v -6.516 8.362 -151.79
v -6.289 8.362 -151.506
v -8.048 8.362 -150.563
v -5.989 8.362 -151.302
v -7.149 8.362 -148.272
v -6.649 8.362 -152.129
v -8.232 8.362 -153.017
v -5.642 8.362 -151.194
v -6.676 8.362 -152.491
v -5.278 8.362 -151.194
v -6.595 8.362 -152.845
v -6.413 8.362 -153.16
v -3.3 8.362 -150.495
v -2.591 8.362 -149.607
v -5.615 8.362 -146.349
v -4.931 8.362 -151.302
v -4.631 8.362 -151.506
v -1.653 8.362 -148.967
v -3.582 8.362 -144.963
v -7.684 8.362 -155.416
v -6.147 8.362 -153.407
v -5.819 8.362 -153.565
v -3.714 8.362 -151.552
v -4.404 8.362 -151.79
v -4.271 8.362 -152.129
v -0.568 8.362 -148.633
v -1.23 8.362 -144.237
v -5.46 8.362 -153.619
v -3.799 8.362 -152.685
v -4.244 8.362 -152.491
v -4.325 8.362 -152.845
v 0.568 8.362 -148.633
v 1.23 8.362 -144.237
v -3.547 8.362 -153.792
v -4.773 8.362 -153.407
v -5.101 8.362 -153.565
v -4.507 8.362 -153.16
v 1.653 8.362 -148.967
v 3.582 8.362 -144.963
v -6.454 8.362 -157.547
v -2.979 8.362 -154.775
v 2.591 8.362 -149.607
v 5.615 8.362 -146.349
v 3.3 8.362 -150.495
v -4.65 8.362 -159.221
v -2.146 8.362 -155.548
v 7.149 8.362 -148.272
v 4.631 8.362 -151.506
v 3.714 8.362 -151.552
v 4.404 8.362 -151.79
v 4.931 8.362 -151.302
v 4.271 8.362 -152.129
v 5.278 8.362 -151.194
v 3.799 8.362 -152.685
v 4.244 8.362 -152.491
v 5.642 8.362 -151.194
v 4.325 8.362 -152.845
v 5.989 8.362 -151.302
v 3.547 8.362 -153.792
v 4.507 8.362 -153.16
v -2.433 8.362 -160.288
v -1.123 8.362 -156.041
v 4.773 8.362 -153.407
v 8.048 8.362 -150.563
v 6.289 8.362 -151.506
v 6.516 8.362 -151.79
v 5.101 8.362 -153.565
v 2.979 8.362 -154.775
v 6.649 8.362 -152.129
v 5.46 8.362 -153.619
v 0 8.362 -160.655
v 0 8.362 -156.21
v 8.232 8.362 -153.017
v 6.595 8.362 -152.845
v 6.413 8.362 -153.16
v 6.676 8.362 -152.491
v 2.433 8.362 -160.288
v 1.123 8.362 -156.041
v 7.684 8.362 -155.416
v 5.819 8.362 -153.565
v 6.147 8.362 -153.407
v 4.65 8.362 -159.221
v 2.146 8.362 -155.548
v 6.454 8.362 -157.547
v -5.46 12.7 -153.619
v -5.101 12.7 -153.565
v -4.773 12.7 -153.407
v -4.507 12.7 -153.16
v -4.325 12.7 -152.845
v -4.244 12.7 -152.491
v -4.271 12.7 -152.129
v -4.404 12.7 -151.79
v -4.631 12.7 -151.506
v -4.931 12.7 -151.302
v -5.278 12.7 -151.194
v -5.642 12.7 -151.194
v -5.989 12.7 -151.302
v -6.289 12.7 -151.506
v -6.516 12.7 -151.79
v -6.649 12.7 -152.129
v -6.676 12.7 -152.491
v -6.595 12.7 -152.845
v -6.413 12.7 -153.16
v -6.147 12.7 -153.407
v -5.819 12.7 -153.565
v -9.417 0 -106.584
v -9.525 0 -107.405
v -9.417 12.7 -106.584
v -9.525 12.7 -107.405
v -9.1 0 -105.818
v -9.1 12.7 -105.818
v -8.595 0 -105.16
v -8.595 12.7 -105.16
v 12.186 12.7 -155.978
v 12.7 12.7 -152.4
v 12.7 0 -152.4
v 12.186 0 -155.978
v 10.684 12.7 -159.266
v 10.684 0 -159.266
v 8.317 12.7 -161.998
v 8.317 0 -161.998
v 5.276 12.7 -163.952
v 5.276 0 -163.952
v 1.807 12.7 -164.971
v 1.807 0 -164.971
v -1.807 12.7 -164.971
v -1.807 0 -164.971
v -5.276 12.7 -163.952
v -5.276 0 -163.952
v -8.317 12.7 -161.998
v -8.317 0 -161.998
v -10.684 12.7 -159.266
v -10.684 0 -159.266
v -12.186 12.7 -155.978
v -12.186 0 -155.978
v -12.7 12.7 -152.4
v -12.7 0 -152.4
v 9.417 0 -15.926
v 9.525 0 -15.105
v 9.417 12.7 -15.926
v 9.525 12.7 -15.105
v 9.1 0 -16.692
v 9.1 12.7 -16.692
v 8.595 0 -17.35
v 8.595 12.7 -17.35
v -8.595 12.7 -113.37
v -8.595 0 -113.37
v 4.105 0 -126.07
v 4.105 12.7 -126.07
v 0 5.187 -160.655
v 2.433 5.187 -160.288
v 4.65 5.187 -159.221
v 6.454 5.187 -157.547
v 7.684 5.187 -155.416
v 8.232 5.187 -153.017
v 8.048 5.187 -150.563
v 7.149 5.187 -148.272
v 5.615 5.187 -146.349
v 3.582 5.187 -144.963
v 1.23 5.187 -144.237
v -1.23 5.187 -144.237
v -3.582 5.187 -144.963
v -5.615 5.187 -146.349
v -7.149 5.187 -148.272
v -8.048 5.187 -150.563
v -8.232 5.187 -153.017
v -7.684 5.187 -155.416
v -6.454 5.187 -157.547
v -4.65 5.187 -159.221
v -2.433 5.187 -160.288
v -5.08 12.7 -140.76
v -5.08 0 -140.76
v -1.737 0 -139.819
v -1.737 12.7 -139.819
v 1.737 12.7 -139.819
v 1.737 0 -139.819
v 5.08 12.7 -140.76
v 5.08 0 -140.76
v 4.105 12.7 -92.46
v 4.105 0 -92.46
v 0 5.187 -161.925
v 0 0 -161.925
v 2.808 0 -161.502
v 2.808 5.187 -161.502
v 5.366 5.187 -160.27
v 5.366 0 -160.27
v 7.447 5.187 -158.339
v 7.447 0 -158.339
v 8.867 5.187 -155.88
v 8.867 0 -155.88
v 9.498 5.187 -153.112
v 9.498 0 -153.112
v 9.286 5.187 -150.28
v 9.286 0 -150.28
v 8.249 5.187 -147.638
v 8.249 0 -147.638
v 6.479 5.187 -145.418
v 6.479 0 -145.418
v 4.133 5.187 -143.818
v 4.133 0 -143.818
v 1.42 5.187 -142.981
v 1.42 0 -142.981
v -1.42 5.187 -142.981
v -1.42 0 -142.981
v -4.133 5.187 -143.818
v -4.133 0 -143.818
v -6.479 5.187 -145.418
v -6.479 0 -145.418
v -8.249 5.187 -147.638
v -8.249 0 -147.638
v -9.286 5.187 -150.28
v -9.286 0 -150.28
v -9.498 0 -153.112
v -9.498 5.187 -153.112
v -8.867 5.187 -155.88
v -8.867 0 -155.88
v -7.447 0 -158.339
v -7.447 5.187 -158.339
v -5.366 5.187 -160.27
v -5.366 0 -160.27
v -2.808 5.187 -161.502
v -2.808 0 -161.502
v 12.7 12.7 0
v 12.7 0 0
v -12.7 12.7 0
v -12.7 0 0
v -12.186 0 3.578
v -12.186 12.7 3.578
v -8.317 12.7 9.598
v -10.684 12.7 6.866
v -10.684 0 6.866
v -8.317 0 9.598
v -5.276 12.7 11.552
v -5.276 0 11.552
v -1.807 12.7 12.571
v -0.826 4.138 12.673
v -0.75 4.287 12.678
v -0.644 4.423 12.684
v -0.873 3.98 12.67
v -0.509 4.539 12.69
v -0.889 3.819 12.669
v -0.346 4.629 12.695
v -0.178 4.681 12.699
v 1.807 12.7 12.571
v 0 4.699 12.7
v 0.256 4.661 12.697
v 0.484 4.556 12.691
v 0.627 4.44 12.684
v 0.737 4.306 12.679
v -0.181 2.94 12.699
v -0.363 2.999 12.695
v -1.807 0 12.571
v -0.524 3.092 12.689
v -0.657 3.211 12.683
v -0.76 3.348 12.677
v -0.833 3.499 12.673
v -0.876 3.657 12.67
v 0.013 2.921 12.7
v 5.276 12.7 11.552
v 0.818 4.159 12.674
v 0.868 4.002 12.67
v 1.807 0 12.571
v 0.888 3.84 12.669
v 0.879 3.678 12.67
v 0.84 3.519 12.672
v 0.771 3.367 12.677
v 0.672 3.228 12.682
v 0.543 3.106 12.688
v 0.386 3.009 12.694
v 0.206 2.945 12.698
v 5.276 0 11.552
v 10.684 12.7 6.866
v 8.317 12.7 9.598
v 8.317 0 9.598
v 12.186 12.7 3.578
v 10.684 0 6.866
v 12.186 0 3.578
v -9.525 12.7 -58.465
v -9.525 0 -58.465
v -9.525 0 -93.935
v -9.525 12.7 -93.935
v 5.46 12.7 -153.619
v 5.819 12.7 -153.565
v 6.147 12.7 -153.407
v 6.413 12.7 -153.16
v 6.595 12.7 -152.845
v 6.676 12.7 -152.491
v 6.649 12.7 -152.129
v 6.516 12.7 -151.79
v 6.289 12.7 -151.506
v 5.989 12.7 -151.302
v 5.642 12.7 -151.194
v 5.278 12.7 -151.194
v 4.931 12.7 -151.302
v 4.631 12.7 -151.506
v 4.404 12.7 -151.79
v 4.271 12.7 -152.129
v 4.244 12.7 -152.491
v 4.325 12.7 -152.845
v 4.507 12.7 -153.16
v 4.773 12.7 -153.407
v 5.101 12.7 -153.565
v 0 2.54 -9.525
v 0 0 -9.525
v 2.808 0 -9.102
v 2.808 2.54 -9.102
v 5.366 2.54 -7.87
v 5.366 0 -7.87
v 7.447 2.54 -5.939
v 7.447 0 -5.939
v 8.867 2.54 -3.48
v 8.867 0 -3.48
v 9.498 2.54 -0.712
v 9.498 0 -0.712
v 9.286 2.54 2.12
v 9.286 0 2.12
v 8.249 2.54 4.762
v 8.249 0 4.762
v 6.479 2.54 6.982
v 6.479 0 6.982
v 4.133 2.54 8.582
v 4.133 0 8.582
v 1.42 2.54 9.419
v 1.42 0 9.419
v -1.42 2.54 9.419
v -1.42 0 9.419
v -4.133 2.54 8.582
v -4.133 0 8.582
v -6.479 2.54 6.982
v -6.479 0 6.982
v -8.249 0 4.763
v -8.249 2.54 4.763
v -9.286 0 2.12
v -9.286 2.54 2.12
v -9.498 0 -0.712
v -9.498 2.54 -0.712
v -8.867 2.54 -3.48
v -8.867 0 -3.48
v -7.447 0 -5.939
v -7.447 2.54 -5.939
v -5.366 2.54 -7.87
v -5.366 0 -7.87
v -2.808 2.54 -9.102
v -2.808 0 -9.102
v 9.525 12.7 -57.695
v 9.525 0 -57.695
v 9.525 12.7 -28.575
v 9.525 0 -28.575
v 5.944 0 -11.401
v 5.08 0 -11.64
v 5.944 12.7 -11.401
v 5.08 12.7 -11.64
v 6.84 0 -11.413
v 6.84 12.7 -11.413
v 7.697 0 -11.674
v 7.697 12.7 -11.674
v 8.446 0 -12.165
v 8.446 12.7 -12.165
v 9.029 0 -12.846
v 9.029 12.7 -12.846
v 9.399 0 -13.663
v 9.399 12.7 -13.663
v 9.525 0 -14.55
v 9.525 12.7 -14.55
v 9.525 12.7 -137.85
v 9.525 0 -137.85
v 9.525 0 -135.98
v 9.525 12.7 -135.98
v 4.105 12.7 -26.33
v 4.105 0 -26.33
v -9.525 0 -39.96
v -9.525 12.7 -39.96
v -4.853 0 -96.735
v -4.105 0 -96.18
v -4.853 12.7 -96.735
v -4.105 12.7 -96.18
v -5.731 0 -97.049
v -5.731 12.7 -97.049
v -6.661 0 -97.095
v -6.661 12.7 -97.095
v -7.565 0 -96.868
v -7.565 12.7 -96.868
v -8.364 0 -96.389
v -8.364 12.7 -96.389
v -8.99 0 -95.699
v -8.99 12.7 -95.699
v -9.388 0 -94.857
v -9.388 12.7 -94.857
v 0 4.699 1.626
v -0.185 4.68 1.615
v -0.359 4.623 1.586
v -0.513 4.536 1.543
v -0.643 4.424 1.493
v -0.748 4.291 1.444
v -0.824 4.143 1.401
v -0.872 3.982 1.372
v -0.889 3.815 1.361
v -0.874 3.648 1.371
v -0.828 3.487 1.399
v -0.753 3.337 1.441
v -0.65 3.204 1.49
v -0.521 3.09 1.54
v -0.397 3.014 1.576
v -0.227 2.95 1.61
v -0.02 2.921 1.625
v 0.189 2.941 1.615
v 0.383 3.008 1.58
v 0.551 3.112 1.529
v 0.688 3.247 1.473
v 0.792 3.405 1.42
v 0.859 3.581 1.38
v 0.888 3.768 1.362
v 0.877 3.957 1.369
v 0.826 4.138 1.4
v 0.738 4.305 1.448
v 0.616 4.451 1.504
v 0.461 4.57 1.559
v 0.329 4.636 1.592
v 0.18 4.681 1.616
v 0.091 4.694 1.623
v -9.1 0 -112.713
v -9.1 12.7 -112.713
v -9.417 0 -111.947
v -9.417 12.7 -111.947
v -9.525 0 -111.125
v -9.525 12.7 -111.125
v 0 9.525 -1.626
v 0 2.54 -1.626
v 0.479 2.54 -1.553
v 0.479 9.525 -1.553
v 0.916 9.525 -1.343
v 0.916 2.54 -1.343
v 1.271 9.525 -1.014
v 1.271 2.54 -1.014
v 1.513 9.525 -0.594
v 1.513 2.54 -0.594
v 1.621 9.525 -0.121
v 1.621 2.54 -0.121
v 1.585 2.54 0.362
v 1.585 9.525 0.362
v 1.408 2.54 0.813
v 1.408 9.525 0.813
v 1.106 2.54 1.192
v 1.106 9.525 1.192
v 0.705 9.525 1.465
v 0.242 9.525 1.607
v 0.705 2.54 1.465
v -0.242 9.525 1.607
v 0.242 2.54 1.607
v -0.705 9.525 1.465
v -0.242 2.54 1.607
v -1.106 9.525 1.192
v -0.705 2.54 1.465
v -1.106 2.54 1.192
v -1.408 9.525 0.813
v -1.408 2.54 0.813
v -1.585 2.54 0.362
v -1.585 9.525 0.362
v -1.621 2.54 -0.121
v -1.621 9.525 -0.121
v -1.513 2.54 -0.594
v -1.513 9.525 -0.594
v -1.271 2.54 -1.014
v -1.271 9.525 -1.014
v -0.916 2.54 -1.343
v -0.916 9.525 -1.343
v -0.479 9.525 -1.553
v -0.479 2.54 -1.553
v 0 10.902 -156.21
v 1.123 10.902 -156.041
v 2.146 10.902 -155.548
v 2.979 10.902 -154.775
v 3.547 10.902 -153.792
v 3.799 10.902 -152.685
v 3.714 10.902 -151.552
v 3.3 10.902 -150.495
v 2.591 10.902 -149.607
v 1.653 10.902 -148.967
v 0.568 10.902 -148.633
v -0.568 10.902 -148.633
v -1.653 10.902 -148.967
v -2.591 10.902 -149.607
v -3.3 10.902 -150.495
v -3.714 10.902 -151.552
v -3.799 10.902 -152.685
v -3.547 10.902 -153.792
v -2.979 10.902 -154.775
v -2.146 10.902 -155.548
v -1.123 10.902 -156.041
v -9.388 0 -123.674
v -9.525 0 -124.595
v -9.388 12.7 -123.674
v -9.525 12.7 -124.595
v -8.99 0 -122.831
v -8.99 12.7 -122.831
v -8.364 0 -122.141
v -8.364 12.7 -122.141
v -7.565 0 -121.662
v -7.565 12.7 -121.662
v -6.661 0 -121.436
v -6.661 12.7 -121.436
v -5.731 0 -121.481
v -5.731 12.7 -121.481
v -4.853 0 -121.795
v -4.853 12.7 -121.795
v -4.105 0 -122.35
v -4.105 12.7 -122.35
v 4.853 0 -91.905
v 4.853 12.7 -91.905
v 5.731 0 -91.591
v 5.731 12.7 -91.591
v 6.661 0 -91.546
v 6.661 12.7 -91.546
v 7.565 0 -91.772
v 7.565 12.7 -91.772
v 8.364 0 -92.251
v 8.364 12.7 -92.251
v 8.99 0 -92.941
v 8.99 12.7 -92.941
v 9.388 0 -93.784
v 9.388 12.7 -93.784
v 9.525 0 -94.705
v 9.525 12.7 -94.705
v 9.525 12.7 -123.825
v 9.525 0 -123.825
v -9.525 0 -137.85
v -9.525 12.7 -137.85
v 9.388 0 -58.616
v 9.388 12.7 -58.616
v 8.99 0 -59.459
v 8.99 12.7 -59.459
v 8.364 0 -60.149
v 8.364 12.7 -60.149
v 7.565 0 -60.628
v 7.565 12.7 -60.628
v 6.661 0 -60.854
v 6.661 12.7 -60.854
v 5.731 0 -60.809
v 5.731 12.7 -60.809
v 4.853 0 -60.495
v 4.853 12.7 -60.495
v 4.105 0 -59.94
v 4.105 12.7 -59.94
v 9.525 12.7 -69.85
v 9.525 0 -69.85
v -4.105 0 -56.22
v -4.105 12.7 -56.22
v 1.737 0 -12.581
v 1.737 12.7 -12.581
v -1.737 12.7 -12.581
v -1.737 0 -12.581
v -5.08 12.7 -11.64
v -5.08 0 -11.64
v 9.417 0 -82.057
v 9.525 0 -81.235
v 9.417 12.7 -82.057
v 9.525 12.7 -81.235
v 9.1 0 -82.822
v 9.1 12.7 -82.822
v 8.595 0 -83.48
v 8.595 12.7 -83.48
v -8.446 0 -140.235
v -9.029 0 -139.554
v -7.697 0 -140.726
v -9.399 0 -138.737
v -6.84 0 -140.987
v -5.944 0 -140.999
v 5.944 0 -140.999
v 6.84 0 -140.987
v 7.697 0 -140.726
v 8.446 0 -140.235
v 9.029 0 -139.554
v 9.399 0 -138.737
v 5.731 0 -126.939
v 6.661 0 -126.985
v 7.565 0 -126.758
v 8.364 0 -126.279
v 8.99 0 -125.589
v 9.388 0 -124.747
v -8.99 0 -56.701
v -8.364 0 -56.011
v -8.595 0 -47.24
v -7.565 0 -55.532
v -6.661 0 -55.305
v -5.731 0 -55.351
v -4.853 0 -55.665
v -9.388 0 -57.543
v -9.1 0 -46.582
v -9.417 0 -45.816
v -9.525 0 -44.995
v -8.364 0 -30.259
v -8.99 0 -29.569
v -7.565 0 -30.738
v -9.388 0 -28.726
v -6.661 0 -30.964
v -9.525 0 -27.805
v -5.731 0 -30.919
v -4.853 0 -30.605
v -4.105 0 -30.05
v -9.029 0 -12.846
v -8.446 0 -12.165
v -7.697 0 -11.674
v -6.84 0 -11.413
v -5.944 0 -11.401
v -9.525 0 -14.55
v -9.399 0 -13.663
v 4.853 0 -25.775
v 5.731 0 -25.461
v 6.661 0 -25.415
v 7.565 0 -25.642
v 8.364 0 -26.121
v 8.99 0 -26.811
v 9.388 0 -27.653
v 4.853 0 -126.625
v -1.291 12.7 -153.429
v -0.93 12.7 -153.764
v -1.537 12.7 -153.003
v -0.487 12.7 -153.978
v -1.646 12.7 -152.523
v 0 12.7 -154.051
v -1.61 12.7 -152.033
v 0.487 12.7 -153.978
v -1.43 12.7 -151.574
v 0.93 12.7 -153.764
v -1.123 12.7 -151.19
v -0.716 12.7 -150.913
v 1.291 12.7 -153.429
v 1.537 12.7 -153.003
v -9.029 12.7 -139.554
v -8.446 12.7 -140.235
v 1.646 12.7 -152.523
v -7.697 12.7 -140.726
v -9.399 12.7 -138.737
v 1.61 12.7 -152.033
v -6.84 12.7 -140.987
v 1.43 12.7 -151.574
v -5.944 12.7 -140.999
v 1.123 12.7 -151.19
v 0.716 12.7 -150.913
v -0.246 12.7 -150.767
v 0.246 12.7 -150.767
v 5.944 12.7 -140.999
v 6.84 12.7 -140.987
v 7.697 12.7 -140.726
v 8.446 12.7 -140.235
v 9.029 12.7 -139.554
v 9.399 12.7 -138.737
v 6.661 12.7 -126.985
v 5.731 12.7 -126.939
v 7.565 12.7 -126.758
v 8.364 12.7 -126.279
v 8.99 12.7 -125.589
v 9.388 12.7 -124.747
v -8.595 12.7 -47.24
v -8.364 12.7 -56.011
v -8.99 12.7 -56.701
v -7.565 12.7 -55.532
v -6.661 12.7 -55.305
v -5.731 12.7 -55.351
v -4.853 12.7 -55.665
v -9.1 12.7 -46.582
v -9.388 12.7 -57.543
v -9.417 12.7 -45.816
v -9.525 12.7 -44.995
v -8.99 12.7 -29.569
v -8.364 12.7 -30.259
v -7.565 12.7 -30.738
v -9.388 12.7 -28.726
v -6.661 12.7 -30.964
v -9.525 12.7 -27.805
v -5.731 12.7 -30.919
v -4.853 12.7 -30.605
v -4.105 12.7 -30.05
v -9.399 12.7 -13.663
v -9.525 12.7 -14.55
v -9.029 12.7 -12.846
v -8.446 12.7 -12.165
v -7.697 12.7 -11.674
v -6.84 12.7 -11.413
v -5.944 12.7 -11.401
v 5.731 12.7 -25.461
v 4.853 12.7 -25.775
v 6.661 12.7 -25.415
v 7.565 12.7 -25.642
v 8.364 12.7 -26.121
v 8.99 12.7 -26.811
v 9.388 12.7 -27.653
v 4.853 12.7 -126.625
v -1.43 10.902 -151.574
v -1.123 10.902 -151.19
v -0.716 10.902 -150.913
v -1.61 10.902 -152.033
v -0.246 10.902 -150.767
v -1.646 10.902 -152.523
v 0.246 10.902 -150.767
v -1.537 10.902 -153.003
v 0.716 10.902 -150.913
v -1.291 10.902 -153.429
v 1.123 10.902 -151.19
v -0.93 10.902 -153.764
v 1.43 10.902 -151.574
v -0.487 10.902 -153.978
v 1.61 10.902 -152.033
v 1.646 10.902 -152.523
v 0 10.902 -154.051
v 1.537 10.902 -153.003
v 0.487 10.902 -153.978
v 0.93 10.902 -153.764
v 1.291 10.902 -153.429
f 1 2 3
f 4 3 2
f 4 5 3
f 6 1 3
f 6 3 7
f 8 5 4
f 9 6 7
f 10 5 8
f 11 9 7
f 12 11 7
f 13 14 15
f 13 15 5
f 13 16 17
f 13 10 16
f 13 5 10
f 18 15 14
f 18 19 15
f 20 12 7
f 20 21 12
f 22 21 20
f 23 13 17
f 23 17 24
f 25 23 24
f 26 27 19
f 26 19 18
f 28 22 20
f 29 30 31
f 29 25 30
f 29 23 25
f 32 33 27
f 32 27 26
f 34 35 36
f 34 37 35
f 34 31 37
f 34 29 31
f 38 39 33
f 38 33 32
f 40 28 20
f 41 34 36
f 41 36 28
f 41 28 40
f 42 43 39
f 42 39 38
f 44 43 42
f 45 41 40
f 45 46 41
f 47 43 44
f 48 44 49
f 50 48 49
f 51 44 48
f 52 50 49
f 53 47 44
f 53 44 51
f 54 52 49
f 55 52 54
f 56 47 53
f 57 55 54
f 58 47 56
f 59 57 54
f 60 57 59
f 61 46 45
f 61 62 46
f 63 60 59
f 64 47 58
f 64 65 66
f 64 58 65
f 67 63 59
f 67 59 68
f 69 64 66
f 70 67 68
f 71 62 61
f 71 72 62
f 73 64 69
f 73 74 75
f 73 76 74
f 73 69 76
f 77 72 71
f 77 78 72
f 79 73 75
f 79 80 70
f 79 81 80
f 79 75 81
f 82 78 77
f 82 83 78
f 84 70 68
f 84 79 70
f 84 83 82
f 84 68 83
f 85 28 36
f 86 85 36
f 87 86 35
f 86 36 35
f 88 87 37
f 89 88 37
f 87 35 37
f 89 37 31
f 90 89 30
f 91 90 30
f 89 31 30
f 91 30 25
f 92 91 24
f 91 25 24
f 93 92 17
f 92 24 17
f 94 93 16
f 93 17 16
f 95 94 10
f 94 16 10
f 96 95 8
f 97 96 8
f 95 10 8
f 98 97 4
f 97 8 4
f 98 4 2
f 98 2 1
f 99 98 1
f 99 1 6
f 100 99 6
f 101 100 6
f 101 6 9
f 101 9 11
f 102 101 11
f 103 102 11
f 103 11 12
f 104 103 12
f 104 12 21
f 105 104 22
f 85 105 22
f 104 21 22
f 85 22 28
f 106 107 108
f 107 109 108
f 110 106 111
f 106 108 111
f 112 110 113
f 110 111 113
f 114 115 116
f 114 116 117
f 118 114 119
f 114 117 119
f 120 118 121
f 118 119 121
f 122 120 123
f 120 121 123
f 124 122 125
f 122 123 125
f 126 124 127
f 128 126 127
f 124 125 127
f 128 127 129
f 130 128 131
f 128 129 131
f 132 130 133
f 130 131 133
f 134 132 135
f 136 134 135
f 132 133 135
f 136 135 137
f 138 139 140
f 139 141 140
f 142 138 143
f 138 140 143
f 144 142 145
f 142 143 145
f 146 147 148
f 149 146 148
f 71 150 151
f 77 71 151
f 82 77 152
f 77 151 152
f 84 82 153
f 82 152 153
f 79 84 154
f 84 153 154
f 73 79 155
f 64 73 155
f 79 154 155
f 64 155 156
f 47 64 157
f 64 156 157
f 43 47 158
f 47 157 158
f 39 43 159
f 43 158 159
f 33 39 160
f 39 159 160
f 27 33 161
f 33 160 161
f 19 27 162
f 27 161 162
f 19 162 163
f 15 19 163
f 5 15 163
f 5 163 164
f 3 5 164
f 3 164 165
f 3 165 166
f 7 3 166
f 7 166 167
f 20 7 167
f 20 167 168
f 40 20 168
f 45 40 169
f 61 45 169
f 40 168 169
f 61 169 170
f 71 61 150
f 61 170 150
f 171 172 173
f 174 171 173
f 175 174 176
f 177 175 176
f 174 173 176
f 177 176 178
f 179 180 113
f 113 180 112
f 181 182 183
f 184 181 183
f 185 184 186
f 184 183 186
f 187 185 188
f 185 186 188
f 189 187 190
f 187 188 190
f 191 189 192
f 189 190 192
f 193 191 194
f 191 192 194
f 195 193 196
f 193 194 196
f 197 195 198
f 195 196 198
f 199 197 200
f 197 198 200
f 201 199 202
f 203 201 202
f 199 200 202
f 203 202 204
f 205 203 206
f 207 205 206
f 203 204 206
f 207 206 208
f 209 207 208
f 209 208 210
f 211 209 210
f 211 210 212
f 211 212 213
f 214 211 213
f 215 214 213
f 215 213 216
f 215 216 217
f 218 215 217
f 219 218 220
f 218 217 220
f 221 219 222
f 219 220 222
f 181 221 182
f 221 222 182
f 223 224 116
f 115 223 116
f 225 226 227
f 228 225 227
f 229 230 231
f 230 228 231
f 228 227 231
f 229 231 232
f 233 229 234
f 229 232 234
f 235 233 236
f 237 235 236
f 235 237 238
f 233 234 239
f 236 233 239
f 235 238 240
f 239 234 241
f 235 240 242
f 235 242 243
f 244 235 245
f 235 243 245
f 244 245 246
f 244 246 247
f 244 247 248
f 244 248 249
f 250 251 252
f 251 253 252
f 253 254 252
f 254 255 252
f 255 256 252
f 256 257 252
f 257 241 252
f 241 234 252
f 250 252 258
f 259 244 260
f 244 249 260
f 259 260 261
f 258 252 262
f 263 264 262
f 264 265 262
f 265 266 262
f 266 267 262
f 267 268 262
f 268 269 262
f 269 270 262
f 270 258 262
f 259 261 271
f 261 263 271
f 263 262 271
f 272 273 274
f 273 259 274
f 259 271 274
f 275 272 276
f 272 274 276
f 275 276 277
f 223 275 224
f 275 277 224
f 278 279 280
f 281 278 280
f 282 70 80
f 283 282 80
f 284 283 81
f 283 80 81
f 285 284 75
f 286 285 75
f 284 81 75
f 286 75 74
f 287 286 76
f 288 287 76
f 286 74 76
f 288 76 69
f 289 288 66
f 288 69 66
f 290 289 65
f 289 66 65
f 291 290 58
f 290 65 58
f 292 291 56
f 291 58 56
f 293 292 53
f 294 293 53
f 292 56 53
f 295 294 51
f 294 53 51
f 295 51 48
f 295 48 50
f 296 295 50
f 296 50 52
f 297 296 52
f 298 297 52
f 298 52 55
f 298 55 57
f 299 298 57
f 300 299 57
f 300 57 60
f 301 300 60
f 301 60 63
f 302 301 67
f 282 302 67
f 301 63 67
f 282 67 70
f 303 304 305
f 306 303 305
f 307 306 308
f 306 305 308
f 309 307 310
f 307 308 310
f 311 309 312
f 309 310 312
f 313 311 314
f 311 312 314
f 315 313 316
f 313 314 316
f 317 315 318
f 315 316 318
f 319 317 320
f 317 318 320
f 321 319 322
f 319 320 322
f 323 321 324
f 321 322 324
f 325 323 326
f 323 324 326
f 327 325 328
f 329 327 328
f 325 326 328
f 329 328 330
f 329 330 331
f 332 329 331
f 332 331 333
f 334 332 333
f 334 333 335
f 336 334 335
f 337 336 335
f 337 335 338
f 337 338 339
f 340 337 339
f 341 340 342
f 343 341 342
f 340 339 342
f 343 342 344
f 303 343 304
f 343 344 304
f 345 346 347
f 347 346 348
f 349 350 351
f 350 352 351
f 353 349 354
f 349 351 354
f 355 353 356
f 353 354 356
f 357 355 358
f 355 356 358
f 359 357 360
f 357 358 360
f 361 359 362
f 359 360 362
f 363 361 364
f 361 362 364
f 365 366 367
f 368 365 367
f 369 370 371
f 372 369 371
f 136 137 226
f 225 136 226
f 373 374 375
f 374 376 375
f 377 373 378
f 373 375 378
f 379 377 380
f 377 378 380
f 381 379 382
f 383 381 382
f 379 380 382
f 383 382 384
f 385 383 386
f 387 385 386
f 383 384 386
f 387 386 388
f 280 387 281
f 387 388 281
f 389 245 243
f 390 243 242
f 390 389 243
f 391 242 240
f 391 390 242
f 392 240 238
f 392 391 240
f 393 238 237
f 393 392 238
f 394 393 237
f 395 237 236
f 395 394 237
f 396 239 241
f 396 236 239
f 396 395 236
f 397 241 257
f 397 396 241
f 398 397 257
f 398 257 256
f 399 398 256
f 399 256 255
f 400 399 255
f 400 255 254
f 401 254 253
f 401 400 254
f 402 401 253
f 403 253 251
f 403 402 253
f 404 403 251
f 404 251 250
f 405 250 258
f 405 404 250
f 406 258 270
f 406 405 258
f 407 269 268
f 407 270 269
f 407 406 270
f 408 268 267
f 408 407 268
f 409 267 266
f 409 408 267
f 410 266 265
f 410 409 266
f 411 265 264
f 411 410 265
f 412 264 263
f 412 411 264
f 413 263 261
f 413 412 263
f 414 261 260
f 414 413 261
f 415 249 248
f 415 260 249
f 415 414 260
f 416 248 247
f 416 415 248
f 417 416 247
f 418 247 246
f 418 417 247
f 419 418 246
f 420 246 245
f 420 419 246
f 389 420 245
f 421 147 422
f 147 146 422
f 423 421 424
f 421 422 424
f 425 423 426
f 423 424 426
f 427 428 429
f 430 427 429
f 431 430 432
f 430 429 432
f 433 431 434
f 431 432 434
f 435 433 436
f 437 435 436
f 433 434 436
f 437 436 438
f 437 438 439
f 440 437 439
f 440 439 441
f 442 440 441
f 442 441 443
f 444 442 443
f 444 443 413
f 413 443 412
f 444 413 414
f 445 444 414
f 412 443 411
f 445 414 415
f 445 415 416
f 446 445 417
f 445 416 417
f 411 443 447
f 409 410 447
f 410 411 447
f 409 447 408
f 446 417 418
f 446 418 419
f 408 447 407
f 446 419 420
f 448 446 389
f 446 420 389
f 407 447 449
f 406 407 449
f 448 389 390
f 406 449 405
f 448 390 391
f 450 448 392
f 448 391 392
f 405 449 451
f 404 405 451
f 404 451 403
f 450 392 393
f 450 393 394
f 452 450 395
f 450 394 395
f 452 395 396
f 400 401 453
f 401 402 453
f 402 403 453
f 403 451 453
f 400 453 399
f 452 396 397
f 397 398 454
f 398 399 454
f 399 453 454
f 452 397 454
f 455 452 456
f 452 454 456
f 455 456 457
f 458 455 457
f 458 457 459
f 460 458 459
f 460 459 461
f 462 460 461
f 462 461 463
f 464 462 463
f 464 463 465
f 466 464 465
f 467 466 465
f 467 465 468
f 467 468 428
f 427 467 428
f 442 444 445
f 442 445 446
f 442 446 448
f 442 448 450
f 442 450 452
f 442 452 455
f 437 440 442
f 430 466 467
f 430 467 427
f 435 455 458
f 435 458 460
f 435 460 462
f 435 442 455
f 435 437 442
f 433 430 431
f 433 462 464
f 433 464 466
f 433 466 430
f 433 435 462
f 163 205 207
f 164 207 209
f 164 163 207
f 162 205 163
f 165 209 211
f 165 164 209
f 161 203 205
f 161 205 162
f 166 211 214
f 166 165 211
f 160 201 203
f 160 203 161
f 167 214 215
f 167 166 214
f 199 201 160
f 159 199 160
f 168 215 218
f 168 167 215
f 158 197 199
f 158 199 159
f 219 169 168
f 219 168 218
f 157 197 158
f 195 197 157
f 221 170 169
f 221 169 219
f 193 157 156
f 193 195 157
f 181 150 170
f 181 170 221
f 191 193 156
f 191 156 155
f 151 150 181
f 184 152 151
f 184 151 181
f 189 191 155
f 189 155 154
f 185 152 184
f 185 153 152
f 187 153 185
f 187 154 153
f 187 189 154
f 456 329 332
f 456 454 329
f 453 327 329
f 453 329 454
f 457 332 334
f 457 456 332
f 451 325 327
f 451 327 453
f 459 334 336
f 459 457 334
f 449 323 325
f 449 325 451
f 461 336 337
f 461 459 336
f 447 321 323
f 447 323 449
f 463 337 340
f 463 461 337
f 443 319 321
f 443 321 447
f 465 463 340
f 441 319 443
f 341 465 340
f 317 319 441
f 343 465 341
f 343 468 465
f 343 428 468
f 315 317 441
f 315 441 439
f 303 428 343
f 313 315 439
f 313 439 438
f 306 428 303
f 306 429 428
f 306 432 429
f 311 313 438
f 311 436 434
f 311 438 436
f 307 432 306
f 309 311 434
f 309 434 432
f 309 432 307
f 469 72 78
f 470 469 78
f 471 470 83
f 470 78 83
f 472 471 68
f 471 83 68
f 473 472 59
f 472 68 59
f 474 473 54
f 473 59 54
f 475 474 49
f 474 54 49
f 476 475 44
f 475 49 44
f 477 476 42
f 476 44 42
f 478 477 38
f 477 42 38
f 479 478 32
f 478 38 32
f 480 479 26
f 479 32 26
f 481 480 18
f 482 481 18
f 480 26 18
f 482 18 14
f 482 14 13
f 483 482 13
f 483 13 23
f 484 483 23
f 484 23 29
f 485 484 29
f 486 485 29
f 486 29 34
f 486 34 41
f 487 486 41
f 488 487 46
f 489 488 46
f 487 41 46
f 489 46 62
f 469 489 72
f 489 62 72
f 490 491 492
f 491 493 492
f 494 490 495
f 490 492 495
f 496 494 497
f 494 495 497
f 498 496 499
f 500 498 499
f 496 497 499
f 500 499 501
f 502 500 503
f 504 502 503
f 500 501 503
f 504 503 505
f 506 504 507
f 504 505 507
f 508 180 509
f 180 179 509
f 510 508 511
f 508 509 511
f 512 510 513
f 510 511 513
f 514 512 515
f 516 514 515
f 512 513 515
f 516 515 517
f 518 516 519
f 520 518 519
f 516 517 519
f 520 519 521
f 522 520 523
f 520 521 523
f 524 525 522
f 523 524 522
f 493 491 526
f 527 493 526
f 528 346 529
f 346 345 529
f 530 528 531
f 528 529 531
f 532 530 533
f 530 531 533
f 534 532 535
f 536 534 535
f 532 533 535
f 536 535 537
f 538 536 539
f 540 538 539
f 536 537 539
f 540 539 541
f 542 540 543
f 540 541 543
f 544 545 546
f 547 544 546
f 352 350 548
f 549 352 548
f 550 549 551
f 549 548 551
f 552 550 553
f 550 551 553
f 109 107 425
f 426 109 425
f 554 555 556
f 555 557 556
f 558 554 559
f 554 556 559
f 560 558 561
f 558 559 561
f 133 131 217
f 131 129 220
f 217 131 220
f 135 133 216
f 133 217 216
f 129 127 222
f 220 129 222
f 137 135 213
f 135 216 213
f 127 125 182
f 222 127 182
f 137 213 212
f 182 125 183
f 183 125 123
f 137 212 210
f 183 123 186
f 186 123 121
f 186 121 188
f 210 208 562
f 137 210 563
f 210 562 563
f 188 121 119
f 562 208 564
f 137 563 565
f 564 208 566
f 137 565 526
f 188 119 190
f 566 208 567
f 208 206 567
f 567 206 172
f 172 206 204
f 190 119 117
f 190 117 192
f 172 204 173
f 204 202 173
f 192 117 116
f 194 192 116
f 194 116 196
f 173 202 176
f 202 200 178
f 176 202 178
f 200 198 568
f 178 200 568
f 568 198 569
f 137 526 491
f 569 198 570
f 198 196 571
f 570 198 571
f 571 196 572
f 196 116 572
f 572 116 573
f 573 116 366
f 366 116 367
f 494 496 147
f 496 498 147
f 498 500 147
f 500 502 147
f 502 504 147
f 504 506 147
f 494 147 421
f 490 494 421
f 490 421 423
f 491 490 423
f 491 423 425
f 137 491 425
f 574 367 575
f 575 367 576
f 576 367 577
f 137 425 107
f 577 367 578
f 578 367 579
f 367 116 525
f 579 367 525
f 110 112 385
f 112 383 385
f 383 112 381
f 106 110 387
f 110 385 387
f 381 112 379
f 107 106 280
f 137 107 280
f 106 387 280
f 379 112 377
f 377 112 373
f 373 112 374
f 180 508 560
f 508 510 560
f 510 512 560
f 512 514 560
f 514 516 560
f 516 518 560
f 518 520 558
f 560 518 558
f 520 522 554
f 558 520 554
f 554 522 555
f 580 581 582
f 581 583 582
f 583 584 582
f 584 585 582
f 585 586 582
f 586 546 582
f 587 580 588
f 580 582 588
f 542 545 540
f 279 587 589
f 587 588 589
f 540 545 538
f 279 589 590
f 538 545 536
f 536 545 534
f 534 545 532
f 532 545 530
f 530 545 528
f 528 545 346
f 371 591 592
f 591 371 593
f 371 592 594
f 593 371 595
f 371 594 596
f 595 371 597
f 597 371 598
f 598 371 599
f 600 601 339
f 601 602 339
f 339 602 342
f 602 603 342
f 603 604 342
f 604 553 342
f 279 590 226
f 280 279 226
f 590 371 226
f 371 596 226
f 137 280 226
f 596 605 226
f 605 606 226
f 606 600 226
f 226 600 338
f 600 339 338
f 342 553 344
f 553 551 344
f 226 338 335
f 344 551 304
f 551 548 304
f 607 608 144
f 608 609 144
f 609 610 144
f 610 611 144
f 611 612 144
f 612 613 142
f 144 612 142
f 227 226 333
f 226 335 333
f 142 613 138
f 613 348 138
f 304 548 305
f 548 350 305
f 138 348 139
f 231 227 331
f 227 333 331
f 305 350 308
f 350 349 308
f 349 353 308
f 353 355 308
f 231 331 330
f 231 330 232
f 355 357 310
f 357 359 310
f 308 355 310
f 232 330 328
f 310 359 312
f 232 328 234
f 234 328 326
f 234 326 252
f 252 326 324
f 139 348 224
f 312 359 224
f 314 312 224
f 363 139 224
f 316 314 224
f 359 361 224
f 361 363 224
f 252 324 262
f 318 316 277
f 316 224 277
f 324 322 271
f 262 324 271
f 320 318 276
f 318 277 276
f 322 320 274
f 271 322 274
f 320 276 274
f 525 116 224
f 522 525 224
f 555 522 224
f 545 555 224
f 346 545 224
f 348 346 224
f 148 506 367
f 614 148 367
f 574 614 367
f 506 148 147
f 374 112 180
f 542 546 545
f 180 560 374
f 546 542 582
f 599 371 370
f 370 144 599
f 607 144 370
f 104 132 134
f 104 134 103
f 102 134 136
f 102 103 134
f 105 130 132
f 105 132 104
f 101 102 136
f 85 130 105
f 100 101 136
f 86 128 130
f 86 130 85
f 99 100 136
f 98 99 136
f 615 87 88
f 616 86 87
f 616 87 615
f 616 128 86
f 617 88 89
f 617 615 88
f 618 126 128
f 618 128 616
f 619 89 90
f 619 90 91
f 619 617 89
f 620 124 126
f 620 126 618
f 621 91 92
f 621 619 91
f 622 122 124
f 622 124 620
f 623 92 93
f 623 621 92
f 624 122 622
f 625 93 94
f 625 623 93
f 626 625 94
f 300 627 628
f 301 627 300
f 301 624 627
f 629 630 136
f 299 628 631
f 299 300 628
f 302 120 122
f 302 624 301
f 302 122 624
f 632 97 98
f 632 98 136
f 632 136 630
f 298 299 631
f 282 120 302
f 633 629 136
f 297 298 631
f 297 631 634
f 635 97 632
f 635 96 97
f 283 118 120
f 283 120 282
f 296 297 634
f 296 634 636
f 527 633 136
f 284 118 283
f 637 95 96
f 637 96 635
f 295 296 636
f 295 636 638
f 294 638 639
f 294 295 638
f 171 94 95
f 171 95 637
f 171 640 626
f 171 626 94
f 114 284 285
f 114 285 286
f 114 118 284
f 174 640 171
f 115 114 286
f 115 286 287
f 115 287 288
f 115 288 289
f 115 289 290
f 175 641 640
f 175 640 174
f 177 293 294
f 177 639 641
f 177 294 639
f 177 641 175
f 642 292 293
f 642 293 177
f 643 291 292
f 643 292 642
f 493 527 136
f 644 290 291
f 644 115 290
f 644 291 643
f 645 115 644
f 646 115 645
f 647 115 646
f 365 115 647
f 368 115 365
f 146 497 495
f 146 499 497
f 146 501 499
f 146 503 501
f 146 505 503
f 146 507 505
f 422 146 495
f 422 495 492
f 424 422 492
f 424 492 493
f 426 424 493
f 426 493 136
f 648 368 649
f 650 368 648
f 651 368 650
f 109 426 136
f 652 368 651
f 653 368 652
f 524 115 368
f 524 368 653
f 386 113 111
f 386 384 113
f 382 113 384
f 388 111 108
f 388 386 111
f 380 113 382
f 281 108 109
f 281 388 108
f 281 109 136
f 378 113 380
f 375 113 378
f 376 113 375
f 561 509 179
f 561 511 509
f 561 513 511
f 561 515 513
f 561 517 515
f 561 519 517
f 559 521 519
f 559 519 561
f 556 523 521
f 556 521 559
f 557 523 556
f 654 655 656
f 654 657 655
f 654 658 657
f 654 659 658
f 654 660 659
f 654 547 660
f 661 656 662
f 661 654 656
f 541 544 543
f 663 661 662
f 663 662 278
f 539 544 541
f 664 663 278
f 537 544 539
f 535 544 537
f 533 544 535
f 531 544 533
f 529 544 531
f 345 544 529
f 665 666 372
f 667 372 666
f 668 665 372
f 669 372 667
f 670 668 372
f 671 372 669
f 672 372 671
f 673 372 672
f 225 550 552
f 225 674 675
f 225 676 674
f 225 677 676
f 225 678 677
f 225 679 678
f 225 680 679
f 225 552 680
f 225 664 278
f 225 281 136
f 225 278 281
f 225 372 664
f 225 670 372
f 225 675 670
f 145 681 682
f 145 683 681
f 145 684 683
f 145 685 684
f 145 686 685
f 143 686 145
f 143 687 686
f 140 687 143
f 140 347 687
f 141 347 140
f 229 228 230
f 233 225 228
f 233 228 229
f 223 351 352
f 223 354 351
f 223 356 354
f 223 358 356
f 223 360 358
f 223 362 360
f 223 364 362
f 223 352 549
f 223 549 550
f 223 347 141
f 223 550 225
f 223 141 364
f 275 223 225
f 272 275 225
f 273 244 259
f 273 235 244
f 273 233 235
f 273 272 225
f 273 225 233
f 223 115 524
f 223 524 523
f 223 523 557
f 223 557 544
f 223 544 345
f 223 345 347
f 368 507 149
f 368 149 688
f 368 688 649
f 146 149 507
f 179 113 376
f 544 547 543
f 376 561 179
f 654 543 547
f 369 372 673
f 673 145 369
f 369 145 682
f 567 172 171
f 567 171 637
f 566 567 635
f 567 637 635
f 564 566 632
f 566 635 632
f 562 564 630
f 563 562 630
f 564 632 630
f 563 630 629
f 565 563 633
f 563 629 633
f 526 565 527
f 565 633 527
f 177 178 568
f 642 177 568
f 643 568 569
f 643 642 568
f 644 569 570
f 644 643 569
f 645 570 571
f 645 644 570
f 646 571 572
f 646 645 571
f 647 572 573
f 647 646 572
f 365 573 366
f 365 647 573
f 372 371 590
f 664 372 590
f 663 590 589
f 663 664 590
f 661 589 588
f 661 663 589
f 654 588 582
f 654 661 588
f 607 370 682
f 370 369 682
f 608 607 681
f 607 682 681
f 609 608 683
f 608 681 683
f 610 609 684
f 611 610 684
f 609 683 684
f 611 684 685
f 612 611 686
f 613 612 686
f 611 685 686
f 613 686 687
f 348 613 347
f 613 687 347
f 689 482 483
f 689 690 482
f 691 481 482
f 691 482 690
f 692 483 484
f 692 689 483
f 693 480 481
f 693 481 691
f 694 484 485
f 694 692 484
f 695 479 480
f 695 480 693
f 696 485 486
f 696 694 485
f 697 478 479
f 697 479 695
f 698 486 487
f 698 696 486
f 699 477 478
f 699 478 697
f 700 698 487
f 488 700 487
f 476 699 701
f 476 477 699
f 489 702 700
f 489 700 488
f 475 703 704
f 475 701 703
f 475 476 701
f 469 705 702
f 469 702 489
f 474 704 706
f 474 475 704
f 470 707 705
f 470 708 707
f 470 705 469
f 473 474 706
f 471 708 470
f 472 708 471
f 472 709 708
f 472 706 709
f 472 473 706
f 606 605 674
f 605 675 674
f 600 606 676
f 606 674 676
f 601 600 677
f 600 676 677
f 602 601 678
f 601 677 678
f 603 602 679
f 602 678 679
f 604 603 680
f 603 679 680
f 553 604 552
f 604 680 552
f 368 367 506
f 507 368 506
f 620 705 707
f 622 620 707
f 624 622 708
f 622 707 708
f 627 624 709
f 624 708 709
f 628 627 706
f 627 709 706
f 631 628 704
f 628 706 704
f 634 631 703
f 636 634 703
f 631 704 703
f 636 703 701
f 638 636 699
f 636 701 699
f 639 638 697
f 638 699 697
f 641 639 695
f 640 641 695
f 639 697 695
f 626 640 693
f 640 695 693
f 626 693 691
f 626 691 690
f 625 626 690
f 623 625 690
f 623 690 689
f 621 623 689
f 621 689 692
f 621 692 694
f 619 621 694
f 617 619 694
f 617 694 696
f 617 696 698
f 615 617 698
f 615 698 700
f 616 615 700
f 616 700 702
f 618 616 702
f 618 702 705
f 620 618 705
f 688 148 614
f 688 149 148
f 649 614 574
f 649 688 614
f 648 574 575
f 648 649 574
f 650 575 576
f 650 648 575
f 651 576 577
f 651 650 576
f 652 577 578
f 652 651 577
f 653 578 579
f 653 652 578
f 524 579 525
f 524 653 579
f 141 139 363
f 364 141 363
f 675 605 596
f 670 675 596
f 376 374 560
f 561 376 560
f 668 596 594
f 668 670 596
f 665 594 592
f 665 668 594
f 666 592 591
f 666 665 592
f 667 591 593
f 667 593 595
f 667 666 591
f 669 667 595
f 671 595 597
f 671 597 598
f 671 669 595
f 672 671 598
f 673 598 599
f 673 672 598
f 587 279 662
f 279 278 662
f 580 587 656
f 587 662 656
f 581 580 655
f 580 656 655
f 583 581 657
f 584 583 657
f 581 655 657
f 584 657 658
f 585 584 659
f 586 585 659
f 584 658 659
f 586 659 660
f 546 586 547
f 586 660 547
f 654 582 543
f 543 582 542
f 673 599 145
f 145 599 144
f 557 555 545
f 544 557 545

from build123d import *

# Parameters (mm, degrees)
SKETCH1_R           = 12.7
BOSS_EXTRUDE1_DEPTH = 12.7
SKETCH2_R           = 1.6256
CUT_EXTRUDE1_DEPTH  = 9.525
SKETCH3_R           = 9.525
CUT_EXTRUDE2_DEPTH  = 2.54
BOSS_EXTRUDE2_START = -12.7
BOSS_EXTRUDE2_DEPTH = 12.7
SKETCH10_R          = 1.651
CUT_EXTRUDE4_DEPTH  = 12.7
SKETCH11_R          = 9.525
CUT_EXTRUDE5_DEPTH  = 5.18668
CUT_EXTRUDE6_DEPTH  = 12.7
FILLET1_R           = 3.175
SKETCH16_R          = 8.255
CUT_EXTRUDE8_DEPTH  = 3.175
SKETCH17_R          = 1.2192
CUT_EXTRUDE9_DEPTH  = 4.33832
SKETCH18_R          = 3.81
CUT_EXTRUDE10_DEPTH = 2.54


with BuildPart() as part:
    # Sketch1 → Boss-Extrude1 (new body)
    with BuildSketch(Plane(origin=(0, 0, 0), x_dir=(1, 0, 0), z_dir=(0, 1, 0))):
        with Locations(Location((0, 0, 0), (0, 0, 270))):
            Circle(SKETCH1_R)
    extrude(amount=BOSS_EXTRUDE1_DEPTH)

    # Sketch2 → Cut-Extrude1 (cut)
    with BuildSketch(Plane.XZ):
        with Locations(Location((0, 0, 0), (0, 0, 270))):
            Circle(SKETCH2_R)
    extrude(amount=-CUT_EXTRUDE1_DEPTH, mode=Mode.SUBTRACT)

    # Sketch3 → Cut-Extrude2 (cut)
    with BuildSketch(Plane.XZ):
        with Locations(Location((0, 0, 0), (0, 0, 270))):
            Circle(SKETCH3_R)
    extrude(amount=-CUT_EXTRUDE2_DEPTH, mode=Mode.SUBTRACT)

    # Sketch5 → #2-56 Tapped Hole1 (revolve, cut)
    with BuildSketch(Plane(origin=(0, 3.81, 0), x_dir=(0, 1, 0), z_dir=(1, 0, 0))):
        Polygon((0, 0), (0, 13.74216509), (0.889, 13.208), (0.889, 0), align=None)
    revolve(axis=Axis((0, 3.81, -6.35), (0, 0, 1)), mode=Mode.SUBTRACT)

    # Sketch7 → Boss-Extrude2 (add)
    with BuildSketch(Plane(origin=(0, 12.7, 0), x_dir=(1, 0, 0), z_dir=(0, 1, 0)).offset(BOSS_EXTRUDE2_START)):
        with BuildLine():
            Line((-12.7, 152.4), (-12.7, 0))
            ThreePointArc((-12.7, 0), (0, 12.7), (12.7, 0))
            Line((12.7, 0), (12.7, 152.4))
            ThreePointArc((12.7, 152.4), (0, 165.1), (-12.7, 152.4))
        make_face()
    extrude(amount=BOSS_EXTRUDE2_DEPTH)

    # Sketch10 → Cut-Extrude4 (cut)
    with BuildSketch(Plane.XZ):
        with Locations(Location((0, -152.4, 0), (0, 0, 270))):
            Circle(SKETCH10_R)
    extrude(amount=-CUT_EXTRUDE4_DEPTH, mode=Mode.SUBTRACT)

    # Sketch11 → Cut-Extrude5 (cut)
    with BuildSketch(Plane.XZ):
        with Locations(Location((0, -152.4, 0), (0, 0, 270))):
            Circle(SKETCH11_R)
    extrude(amount=-CUT_EXTRUDE5_DEPTH, mode=Mode.SUBTRACT)

    # Sketch15 → Cut-Extrude6 (cut)
    with BuildSketch(Plane.XZ):
        with BuildLine():
            Line((-9.525, -35.469743879), (9.525, -16.419743879))
            Line((9.525, -16.419743879), (9.525, -8.400260413))
            ThreePointArc((9.525, -8.400260413), (0, -12.7), (-9.525, -8.400260413))
            Line((-9.525, -8.400260413), (-9.525, -35.469743879))
        make_face()
        Polygon((-9.525, -46.309871939), (9.525, -65.359871939), (9.525, -20.909871939), (-9.525, -39.959871939), align=None)
        Polygon((-9.525, -76.2), (9.525, -76.2), (9.525, -69.85), (-9.525, -50.8), align=None)
        Polygon((9.525, -82.55), (9.525, -76.2), (-9.525, -76.2), (-9.525, -101.6), align=None)
        Polygon((9.525, -131.490128061), (9.525, -87.040128061), (-9.525, -106.090128061), (-9.525, -112.440128061), align=None)
        with BuildLine():
            Line((9.525, -143.999739587), (9.525, -135.980256121))
            Line((9.525, -135.980256121), (-9.525, -116.930256121))
            Line((-9.525, -116.930256121), (-9.525, -143.999739587))
            ThreePointArc((-9.525, -143.999739587), (0, -139.7), (9.525, -143.999739587))
        make_face()
    extrude(amount=-CUT_EXTRUDE6_DEPTH, mode=Mode.SUBTRACT)

    # Fillet1
    fillet1_edges = [part.edges().sort_by_distance(p)[0] for p in [
        (9.525, 6.35, -143.999739587),
        (-9.525, 6.35, -143.999739587),
        (-9.525, 6.35, -116.930256121),
        (-9.525, 6.35, -35.469743879),
        (9.525, 6.35, -16.419743879),
        (9.525, 6.35, -8.400260413),
        (-9.525, 6.35, -8.400260413),
        (-9.525, 6.35, -46.309871939),
        (9.525, 6.35, -65.359871939),
        (9.525, 6.35, -20.909871939),
        (-9.525, 6.35, -101.6),
        (-9.525, 6.35, -50.8),
        (9.525, 6.35, -82.55),
        (9.525, 6.35, -131.490128061),
        (9.525, 6.35, -87.040128061),
        (-9.525, 6.35, -106.090128061),
        (-9.525, 6.35, -112.440128061),
    ]]
    fillet(fillet1_edges, radius=FILLET1_R)

    # Sketch16 → Cut-Extrude8 (cut)
    with BuildSketch(Plane.XZ.offset(-5.18668)):
        with Locations(Location((0, -152.4, 0), (0, 0, 270))):
            Circle(SKETCH16_R)
    extrude(amount=-CUT_EXTRUDE8_DEPTH, mode=Mode.SUBTRACT)

    # Sketch17 → Cut-Extrude9 (cut)
    with BuildSketch(Plane.XZ.offset(-8.36168)):
        with Locations(Location((-5.4599967, -152.4, 0), (0, 0, 270))):
            Circle(SKETCH17_R)
        with Locations(Location((5.4599967, -152.4, 0), (0, 0, 270))):
            Circle(SKETCH17_R)
    extrude(amount=-CUT_EXTRUDE9_DEPTH, mode=Mode.SUBTRACT)

    # Sketch18 → Cut-Extrude10 (cut)
    with BuildSketch(Plane.XZ.offset(-8.36168)):
        with Locations(Location((0, -152.4, 0), (0, 0, 270))):
            Circle(SKETCH18_R)
    extrude(amount=-CUT_EXTRUDE10_DEPTH, mode=Mode.SUBTRACT)


solid = part.part
